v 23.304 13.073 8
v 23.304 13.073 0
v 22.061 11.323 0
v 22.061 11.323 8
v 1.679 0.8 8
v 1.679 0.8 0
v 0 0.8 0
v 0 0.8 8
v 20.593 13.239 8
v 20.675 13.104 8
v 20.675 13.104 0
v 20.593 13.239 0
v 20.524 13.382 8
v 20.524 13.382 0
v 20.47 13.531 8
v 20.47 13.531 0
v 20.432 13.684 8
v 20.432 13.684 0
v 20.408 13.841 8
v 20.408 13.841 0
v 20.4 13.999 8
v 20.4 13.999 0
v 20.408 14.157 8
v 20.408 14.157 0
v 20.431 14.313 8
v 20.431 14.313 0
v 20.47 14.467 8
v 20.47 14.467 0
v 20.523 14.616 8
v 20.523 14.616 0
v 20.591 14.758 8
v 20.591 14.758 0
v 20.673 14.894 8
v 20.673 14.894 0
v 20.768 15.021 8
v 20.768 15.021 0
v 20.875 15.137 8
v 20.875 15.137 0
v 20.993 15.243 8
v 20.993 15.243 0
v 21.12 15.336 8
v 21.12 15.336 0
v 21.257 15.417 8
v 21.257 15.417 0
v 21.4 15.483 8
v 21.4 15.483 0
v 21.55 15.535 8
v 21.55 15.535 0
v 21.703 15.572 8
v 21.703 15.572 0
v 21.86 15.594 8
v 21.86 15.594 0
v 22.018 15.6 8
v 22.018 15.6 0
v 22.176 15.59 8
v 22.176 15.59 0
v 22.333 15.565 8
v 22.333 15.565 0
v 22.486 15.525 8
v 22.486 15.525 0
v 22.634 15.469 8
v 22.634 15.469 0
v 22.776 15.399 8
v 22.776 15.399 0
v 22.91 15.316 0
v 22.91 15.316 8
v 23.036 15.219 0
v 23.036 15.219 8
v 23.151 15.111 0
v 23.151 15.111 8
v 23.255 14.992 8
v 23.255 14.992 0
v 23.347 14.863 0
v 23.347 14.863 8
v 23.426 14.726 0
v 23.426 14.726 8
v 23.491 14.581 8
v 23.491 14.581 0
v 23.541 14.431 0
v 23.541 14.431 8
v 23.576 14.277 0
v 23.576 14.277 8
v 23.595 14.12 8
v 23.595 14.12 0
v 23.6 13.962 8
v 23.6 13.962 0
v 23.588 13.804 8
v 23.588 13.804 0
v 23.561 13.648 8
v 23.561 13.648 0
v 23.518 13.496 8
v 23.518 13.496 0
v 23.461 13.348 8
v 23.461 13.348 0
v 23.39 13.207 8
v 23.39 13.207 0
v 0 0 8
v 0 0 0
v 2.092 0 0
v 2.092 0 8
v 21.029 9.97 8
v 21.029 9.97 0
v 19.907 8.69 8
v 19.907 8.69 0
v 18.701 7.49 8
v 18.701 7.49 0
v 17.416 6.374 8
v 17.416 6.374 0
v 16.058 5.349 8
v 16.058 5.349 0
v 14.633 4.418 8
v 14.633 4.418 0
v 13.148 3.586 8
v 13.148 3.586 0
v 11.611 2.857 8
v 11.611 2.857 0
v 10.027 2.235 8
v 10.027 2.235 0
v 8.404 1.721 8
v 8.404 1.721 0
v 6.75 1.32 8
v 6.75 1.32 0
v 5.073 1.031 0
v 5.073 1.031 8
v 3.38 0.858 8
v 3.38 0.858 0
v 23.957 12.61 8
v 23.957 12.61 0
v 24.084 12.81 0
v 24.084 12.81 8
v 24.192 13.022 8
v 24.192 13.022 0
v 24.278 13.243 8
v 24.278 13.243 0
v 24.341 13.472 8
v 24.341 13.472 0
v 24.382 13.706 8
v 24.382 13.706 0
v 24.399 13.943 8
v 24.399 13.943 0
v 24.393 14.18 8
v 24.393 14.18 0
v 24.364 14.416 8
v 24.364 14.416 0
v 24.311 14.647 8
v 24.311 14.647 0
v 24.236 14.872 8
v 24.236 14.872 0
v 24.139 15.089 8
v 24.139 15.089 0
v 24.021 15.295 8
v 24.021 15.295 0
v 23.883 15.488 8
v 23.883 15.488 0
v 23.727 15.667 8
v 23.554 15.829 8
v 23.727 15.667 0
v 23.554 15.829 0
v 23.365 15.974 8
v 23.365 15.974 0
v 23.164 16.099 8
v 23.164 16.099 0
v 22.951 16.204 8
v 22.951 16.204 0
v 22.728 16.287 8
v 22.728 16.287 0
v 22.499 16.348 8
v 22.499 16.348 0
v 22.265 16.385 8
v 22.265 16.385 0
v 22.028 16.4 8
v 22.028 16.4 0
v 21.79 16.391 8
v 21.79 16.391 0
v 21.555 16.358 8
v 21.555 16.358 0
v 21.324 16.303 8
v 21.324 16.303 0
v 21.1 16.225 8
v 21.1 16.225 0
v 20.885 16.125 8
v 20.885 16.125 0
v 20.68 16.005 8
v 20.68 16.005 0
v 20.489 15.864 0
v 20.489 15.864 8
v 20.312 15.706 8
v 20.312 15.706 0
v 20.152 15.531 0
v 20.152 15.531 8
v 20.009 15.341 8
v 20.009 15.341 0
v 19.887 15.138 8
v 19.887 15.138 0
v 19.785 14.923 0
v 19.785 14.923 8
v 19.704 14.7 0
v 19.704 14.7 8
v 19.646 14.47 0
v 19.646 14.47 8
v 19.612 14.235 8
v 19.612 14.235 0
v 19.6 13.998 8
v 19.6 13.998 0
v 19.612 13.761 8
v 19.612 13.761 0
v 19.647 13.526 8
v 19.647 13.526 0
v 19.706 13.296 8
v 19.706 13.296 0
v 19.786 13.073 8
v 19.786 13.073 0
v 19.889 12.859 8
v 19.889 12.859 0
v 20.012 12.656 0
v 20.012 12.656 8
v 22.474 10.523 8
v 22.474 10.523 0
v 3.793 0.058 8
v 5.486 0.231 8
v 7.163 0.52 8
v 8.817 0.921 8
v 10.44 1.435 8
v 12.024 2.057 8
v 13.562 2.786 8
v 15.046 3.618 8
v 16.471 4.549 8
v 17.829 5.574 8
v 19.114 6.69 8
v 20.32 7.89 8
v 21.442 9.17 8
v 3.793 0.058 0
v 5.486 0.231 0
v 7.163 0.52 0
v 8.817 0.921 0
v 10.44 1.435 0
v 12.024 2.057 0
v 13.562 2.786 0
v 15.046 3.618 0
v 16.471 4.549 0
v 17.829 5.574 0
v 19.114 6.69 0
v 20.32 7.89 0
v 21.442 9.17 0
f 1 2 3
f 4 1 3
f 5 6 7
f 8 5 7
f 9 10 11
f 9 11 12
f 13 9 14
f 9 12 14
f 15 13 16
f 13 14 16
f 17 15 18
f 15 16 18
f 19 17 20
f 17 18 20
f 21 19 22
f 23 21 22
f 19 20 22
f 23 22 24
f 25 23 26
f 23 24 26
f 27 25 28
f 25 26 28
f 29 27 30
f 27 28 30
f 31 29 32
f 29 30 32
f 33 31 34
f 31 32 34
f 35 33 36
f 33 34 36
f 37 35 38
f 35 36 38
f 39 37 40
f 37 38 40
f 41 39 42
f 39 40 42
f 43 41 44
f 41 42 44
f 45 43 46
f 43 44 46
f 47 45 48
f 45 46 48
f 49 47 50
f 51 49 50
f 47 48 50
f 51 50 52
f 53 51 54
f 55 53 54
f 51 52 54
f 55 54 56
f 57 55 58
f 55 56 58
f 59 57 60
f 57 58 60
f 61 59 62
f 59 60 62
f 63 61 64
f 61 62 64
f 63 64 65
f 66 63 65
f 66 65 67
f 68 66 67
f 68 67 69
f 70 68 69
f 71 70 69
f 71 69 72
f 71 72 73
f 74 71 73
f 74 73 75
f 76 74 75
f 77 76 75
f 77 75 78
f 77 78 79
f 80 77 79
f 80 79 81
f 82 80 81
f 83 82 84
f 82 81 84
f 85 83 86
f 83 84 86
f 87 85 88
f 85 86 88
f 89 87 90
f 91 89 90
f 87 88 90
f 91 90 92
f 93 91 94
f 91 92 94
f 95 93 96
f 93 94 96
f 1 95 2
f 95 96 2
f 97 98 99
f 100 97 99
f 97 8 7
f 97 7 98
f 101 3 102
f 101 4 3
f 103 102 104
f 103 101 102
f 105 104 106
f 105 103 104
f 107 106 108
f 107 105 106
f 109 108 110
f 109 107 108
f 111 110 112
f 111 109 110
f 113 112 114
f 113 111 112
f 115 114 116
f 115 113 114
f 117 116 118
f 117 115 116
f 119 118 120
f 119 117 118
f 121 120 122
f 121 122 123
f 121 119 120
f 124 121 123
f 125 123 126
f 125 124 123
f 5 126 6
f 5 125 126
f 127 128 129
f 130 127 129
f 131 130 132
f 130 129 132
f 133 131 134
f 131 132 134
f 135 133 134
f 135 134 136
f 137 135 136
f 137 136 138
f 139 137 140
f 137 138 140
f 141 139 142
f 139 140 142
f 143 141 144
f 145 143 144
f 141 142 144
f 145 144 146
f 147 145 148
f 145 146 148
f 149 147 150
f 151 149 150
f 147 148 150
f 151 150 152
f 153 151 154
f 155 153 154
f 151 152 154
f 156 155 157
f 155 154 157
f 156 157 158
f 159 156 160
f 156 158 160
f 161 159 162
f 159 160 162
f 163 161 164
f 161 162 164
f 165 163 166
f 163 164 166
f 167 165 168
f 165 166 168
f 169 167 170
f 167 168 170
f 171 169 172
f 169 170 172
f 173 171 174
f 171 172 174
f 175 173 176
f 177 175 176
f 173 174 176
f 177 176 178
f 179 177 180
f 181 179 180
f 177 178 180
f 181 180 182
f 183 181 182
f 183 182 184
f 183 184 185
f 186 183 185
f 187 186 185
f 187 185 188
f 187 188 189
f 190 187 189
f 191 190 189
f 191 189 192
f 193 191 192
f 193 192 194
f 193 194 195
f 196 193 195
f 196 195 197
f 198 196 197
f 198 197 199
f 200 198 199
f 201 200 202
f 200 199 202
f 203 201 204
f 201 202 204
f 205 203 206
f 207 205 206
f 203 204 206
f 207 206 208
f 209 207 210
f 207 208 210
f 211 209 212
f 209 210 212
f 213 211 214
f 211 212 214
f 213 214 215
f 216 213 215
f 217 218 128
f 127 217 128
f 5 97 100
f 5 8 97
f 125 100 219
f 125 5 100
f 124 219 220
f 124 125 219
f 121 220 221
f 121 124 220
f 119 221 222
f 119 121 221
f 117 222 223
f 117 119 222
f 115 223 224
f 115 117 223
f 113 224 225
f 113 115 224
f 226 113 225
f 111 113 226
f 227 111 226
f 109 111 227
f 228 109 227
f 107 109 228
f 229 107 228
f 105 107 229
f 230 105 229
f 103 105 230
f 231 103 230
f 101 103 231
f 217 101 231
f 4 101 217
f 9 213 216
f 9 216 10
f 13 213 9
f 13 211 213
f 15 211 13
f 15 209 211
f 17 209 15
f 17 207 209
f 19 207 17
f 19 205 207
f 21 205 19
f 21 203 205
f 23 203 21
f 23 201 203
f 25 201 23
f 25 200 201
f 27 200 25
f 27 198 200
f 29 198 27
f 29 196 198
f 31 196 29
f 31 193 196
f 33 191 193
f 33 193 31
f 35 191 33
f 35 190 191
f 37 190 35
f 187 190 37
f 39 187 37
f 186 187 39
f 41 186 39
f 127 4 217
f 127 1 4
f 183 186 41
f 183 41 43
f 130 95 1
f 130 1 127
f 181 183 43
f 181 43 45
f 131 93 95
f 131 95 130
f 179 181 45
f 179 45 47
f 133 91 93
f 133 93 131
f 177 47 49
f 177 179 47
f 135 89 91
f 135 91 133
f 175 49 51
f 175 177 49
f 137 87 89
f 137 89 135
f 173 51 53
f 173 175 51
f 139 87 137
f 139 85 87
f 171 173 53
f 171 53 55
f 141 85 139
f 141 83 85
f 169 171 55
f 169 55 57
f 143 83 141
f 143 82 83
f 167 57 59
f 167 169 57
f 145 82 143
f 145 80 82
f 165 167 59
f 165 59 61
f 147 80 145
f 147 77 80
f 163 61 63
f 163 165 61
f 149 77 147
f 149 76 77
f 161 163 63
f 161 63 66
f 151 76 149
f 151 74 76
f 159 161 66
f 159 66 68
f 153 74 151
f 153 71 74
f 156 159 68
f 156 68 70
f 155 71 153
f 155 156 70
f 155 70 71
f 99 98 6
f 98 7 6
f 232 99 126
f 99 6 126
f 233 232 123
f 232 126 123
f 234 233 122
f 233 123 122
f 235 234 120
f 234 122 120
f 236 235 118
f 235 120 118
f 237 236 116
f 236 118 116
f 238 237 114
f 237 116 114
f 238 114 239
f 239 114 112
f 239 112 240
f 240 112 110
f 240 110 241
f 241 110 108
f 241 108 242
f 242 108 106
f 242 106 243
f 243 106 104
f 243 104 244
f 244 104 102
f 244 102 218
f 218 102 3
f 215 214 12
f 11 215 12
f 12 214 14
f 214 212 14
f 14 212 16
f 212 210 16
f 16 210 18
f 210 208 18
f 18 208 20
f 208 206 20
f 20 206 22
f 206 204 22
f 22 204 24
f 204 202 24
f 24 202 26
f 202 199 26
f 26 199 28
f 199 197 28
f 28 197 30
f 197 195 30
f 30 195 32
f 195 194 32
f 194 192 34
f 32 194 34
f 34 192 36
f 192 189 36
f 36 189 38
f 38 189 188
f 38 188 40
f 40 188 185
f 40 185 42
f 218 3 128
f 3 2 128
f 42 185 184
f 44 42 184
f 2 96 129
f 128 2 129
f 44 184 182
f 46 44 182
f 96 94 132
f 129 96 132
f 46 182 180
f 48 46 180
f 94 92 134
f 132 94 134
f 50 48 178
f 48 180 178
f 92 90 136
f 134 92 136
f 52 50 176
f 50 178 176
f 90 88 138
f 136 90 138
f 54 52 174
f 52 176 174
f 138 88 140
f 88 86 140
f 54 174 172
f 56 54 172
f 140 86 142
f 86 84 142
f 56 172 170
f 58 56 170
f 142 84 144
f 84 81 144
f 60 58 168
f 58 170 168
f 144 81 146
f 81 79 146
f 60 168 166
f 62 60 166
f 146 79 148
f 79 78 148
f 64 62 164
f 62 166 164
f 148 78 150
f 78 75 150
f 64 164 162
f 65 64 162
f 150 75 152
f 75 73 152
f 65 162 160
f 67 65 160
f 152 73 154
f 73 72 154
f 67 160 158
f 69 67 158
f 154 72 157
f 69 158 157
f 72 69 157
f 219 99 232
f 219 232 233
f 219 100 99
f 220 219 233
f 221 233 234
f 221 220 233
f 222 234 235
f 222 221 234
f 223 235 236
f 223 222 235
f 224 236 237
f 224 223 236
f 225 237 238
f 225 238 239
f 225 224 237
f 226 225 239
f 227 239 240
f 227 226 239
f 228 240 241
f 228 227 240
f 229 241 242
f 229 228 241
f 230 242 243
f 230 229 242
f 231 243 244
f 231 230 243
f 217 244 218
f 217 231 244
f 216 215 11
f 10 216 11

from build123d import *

# Parameters (mm, degrees)
BOSS_EXTRUDE1_DEPTH = 8
FILLET1_R           = 25


with BuildPart() as part:
    # Sketch1 → Boss-Extrude1 (new body)
    with BuildSketch(Plane.XY):
        with BuildLine():
            Line((0, 0), (15, 0))
            Line((15, 0), (23.956669948, 12.610236454))
            ThreePointArc((23.956669948, 12.610236454), (22.027601971, 16.399841272), (20.011882934, 12.655607746))
            Line((20.011882934, 12.655607746), (20.674588623, 13.103738497))
            ThreePointArc((20.674588623, 13.103738497), (22.018401314, 15.599894181), (23.304446632, 13.07349097))
            Line((23.304446632, 13.07349097), (14.586956827, 0.8))
            Line((14.586956827, 0.8), (0, 0.8))
            Line((0, 0.8), (0, 0))
        make_face()
    extrude(amount=BOSS_EXTRUDE1_DEPTH)

    # Fillet1
    fillet1_edges = [part.edges().sort_by_distance(p)[0] for p in [
        (14.586956827, 0.8, 4),
        (15, 0, 4),
    ]]
    fillet(fillet1_edges, radius=FILLET1_R)


solid = part.part
